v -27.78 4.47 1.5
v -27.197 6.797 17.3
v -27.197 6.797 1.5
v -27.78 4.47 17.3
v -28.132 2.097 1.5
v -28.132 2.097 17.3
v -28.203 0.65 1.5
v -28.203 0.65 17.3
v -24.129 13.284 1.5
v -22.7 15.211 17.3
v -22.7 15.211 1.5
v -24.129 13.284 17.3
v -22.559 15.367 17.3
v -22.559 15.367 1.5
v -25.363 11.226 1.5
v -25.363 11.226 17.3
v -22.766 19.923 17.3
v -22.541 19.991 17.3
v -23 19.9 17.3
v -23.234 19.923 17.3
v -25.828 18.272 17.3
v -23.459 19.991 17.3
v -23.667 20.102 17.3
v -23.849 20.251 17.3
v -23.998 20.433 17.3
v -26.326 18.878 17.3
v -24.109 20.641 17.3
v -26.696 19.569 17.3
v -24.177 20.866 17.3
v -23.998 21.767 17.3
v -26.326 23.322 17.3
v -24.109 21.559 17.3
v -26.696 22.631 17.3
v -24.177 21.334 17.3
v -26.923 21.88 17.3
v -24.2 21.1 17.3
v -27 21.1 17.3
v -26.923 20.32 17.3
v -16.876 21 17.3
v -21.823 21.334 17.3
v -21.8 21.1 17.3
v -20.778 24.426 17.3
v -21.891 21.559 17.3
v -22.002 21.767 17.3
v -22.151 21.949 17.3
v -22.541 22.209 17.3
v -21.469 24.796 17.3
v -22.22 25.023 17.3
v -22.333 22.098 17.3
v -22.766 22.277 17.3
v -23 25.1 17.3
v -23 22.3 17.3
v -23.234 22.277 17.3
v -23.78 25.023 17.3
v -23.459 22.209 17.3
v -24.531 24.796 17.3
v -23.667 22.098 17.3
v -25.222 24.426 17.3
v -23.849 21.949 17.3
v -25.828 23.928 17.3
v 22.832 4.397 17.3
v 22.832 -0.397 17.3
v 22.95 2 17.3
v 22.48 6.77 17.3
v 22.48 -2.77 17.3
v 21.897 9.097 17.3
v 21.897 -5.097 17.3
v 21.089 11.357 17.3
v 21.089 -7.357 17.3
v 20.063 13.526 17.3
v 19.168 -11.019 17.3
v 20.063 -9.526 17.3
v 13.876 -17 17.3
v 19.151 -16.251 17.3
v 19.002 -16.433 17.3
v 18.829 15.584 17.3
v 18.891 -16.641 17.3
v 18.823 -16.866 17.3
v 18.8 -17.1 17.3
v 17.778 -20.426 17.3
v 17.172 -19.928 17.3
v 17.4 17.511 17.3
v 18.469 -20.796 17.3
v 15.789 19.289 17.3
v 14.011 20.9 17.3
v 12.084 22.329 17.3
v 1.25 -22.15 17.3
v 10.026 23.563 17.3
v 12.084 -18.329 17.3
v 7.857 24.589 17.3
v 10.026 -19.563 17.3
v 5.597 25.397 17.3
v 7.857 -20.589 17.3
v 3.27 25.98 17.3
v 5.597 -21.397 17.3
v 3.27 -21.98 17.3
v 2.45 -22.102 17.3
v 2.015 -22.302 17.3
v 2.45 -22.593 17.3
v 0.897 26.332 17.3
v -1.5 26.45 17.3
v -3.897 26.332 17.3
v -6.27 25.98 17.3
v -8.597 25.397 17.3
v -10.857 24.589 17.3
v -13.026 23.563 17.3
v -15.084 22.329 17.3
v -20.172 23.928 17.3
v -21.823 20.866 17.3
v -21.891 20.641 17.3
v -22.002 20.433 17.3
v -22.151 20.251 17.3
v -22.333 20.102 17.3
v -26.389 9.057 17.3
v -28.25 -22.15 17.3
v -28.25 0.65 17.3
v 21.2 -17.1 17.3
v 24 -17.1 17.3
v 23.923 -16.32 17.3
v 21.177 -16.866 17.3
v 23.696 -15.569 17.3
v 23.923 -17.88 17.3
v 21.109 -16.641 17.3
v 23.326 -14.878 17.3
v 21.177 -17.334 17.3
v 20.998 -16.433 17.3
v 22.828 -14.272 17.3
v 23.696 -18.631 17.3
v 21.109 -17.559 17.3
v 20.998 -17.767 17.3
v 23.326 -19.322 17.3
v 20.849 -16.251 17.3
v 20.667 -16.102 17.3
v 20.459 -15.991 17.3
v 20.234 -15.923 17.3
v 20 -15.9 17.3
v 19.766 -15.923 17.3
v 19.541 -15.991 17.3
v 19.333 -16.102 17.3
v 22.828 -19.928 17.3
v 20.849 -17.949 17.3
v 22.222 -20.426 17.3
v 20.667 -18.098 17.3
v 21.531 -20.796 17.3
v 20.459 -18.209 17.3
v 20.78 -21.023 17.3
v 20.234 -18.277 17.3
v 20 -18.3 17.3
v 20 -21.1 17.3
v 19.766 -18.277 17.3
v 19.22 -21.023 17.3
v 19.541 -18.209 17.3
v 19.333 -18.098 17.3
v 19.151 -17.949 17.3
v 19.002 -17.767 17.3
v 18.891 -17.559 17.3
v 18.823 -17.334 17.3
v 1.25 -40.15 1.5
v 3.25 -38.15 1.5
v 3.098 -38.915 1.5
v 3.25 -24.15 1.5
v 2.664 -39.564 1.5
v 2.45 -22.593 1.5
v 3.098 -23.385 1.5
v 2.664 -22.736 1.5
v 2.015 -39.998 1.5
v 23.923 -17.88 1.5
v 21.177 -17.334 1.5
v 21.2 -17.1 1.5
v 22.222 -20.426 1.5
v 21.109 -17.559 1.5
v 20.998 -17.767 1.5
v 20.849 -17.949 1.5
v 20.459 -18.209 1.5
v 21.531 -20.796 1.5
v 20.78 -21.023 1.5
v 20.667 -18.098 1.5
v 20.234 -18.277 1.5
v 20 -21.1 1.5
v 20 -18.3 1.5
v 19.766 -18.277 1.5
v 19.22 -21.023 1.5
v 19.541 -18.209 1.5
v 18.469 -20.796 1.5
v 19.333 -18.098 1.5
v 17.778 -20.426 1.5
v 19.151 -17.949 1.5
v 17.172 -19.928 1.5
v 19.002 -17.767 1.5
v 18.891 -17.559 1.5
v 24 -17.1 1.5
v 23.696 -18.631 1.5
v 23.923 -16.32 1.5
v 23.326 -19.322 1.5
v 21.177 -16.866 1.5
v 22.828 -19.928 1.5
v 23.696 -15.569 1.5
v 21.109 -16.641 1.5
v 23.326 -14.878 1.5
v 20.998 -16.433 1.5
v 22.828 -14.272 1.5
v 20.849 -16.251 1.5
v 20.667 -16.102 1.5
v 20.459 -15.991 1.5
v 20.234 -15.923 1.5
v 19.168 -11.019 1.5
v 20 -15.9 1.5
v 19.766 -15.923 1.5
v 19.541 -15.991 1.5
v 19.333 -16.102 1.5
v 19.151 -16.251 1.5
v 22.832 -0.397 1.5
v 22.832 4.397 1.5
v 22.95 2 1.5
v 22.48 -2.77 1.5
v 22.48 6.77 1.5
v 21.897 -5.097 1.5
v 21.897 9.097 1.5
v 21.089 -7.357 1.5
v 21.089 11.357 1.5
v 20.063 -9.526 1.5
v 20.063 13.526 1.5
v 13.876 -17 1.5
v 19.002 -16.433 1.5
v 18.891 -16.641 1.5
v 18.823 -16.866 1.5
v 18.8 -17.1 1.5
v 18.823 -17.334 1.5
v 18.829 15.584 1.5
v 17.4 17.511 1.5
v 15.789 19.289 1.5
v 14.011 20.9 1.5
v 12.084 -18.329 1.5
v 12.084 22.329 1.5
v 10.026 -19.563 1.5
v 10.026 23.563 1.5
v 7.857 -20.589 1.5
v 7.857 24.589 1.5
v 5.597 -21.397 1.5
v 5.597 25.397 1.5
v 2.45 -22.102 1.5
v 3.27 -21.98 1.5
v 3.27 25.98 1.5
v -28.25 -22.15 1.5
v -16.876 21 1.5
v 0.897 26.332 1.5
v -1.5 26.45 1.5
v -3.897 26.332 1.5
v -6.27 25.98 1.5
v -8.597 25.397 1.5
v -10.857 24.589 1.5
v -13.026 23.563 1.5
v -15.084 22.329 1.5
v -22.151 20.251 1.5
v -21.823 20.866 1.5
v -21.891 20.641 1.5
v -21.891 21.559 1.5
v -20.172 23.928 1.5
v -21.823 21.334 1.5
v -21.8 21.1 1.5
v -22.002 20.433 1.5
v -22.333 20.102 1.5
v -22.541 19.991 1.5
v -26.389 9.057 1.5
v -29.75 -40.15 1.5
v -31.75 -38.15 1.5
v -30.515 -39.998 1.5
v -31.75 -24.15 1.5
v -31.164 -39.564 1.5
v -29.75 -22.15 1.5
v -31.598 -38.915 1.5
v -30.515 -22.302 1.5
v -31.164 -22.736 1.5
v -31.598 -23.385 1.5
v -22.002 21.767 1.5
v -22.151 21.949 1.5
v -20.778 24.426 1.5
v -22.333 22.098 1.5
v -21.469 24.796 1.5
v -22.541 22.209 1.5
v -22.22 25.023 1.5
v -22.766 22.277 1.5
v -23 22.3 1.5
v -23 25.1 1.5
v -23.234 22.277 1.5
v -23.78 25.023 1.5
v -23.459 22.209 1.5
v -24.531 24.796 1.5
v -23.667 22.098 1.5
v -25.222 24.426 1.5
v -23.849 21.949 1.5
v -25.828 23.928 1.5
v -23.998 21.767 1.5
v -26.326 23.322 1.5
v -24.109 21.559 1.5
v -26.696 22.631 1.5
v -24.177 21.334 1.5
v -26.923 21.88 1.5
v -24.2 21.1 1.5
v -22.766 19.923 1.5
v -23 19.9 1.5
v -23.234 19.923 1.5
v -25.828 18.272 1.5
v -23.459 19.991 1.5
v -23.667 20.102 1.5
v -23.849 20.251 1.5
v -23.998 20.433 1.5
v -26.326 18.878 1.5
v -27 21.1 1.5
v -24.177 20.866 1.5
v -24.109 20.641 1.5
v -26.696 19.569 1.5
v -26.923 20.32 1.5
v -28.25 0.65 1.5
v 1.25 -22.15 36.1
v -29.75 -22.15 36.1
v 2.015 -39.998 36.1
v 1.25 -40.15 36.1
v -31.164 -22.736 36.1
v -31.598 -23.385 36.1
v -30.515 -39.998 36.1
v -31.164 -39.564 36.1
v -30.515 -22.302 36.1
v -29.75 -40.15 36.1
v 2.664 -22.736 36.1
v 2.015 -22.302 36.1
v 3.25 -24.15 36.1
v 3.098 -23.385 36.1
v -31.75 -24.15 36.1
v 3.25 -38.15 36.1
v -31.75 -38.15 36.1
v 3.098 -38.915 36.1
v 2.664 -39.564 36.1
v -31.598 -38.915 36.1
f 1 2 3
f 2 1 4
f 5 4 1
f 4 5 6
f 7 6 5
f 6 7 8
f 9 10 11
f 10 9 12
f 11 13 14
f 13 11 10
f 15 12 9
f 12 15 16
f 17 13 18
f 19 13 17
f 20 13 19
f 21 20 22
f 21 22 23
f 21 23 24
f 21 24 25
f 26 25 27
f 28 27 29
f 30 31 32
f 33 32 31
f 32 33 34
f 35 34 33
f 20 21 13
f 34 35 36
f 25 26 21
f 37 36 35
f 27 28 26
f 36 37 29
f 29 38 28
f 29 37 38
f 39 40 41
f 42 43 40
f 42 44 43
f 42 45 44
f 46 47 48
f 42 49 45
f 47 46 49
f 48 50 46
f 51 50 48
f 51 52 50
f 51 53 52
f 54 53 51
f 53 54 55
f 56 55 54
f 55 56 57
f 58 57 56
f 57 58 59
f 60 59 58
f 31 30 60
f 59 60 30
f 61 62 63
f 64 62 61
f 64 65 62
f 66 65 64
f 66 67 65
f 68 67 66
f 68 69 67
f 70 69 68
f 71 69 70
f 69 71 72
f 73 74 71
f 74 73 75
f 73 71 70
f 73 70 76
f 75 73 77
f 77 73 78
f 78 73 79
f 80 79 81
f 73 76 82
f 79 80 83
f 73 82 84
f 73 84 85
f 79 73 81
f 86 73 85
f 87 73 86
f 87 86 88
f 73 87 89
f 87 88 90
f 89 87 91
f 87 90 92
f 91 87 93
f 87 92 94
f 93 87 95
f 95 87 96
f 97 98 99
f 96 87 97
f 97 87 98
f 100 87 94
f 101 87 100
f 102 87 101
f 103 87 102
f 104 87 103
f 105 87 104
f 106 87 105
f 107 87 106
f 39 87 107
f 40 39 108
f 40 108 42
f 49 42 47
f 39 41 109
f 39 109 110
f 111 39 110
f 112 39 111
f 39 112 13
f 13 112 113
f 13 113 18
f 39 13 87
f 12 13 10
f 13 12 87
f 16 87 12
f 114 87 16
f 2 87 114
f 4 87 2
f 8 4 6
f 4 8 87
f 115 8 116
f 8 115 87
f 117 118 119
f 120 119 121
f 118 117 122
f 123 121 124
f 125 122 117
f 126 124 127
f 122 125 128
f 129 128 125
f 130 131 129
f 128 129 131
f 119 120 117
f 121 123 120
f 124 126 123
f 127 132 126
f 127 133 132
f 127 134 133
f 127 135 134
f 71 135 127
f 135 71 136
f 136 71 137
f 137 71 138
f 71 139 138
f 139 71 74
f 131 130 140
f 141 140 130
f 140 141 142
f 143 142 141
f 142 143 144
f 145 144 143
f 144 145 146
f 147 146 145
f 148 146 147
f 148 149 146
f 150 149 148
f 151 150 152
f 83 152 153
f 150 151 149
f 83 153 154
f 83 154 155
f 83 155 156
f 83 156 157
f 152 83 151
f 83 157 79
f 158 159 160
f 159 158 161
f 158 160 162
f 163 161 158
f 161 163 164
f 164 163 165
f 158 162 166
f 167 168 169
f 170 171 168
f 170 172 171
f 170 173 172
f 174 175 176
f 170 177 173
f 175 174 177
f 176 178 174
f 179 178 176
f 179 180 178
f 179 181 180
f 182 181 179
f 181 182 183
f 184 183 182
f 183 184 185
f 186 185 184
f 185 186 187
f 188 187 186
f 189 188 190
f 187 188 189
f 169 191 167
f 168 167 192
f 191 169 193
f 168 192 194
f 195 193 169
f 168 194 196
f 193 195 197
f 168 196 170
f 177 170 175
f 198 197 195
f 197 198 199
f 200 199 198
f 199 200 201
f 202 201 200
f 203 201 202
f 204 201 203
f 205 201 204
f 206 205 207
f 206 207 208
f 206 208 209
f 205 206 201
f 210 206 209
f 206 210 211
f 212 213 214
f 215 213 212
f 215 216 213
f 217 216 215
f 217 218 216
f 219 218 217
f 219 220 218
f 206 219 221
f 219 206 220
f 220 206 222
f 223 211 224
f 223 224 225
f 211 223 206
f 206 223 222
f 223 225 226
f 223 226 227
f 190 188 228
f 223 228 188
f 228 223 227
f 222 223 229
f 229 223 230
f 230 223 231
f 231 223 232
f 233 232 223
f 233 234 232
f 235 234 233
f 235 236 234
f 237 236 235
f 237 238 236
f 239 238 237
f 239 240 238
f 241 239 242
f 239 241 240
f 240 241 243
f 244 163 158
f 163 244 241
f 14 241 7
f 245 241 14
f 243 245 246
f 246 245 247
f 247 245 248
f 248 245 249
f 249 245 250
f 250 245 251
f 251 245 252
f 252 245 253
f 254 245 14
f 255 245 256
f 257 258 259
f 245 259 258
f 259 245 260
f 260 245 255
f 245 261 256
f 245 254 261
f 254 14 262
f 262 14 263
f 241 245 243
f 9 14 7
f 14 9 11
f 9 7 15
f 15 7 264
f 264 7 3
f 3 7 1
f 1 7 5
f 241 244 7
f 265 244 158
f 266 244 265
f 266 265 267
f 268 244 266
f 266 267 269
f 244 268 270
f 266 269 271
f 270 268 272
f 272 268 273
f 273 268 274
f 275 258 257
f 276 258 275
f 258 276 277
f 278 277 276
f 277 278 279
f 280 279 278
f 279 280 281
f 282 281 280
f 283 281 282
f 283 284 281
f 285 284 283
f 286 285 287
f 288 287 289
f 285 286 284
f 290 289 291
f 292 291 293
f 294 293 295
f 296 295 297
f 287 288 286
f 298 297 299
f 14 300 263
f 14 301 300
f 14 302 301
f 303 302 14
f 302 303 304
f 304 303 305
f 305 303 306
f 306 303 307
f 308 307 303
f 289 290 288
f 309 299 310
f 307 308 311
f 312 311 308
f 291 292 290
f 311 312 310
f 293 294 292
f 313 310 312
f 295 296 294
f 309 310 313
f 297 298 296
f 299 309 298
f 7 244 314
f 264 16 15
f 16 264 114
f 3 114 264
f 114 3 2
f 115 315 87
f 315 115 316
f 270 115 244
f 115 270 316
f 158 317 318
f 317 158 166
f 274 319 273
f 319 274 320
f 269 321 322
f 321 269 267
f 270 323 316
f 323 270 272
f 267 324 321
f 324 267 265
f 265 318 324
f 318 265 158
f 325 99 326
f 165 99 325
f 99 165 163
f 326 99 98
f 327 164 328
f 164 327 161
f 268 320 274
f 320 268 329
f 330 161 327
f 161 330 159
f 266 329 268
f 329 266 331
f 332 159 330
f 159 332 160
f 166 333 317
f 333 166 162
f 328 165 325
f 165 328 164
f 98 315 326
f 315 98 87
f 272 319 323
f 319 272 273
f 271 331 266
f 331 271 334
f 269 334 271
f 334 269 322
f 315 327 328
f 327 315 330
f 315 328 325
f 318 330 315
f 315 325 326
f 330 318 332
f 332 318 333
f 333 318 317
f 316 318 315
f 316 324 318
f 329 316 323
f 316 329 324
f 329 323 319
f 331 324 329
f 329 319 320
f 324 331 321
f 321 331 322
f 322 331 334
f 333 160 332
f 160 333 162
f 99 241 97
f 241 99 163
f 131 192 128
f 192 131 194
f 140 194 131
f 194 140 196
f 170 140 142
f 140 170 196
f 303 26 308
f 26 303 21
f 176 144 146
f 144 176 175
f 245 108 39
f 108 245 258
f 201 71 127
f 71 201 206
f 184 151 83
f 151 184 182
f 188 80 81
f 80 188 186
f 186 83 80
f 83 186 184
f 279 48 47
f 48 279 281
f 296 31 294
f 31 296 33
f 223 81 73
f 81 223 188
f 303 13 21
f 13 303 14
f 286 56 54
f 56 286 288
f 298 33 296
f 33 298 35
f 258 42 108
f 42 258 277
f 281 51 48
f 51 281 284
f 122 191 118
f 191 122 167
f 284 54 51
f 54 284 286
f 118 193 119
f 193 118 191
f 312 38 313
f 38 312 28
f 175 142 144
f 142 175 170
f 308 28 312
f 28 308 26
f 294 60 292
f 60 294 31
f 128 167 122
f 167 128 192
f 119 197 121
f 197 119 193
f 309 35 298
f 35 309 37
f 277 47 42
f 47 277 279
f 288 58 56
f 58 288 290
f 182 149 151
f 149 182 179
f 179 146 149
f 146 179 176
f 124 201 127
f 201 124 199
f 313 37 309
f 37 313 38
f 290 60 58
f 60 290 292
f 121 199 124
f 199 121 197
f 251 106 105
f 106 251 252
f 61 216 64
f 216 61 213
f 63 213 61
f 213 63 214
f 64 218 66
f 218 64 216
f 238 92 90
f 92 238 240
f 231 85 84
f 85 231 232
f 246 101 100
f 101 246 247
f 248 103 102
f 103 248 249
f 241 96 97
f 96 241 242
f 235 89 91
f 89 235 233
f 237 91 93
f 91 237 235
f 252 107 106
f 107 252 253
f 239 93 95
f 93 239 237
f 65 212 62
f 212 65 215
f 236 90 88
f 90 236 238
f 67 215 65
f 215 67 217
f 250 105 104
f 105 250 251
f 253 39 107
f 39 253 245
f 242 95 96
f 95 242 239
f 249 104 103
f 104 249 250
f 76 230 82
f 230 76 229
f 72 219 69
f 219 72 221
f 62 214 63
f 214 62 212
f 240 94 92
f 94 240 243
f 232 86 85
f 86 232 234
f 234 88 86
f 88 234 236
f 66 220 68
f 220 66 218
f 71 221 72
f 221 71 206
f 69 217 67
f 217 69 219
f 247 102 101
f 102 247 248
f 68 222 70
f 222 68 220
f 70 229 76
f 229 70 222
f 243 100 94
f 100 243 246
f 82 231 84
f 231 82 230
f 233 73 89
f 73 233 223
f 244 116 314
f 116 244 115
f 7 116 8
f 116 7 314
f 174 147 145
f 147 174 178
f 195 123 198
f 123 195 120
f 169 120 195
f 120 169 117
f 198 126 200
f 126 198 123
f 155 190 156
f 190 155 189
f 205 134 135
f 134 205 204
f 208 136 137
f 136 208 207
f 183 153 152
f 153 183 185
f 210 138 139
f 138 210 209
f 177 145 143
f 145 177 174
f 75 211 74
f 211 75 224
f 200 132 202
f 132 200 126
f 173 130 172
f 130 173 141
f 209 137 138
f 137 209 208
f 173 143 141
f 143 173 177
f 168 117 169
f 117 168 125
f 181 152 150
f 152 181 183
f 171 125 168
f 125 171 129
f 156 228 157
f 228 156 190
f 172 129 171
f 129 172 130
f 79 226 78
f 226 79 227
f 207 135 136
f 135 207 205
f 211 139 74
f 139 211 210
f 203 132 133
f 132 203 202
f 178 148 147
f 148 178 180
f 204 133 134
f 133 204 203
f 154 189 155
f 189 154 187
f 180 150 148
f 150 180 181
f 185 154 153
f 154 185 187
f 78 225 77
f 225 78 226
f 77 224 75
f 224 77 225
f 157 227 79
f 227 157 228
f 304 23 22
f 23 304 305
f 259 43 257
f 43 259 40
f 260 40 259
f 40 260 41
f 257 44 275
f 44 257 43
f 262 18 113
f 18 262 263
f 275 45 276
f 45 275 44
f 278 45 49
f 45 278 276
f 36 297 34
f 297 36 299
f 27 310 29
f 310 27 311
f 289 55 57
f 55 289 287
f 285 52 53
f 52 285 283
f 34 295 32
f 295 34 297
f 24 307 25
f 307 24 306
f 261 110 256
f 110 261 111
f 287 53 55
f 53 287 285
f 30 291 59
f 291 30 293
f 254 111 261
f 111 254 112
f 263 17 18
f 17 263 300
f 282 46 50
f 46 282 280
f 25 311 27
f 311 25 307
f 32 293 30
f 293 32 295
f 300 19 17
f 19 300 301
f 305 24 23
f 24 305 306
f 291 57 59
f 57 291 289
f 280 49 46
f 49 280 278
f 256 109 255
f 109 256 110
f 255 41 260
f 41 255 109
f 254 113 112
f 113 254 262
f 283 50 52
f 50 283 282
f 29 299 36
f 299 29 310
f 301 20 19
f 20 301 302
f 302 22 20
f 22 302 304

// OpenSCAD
// file: ../../configuration.scad
/*
	Konfiguracni soubor 3D tiskarny RebeliX BoX
	
	Sledujte nas na:		  
			www.RebeliX.cz
			www.facebook.com/RebeliX.cz
			https://twitter.com/reprap4u
			https://plus.google.com/+Reprap4uCz-3Dtiskarna-RebeliX
			
	License: GNU GPL v3
*/


/* ========================== Z probe ======================= */

// Prumer Z probe
Z_probe_D = 12.2;
// Delka Z probe
Z_probe_H = 62;
// Delka zavitu
Z_probe_screw_H = 42;
// Prumer matky k sonde
Z_probe_nut_D = 19;
// Vyska matky
Z_probe_nut_H = 3.8;
// Prumer podlozky k sonde
Z_probe_washer_D = 22;


/* ================ Parametry energo retezu ================= */

// Sirka zarazek retezu
mantinel_W = 1.4; 

// Sirka prichytu retezu (v miste, kde jsou otvory na pridelani)
chain_mount_W = 18;

// Vyska retezu 
chain_H = 15.4;
//chain_H = 14.8;

// Sirka retezu
chain_W = chain_mount_W + 0.9;

//Vzdalenost od profilu
chain_x_offset = 1.5;


/* =================== Nastaveni pro osu Z ================== */

// Prumer hlazene tyce
//rod_D = 8.1; // 8 mm
rod_D = 10.1; // 10 mm
//rod_D = 12.2; // 12 mm

// Vzdalenost stredu hlazene tyce od hrany profilu
rod_offset = 20;

// Prostor kolem maticky pro pridelani heatbed
mount_dia = 20;


/* ============== Parametry kolejnice a voziku ============== */

// Sirka kolejnice
rail_W = 12;

// Tloustka kolejnice
rail_H = 8;

// Jak daleko od rezu je prvni otvor v kolejnici
rail_first_hole = 11;

// Vzdalenost otvoru v kolejnici
rail_hole_distance = 25;

// Otvory pro pridelani na voziku MGN12
MGN12_holes = [
  [10, 10, 0],
  [10, -10, 0],
  [-10, -10, 0],
  [-10, 10, 0]
];

// Vyska pojezdu MGN12_H i s kolejnici
MGN12_H = 13;

// Sirka voziku MGN12
MGN12_W = 27;


/* ======================= Obecne =========================== */

// Sirka hlinikoveho profilu
profile_width = 30;

// Radius zakulacenych rohu
corner_rad = 6; 


/* ================== Spojovaci material ==================== */

// --------------- M3 ----------------
// Prumer hlavy M3 sroubu
M3_head_D = 6.5;

// Prumer M3 sroubu
M3_screw_D = 3.3;

// Vyska hlavy M3 sroubu
M3_head_H = 2;

// Prumer M3 podlozek
M3_washer_D = 6.8;

// Tloustka M3 podlozky
M3_washer_H = 0.5;

// Prumer M3 matky
M3_nut_D=6.6;

// Vyska M3 matky
M3_nut_H = 3;

M3x10_offset = 6; // Sroub M3x10;

// --------------- M4 ----------------

// Prumer hlavy M4 sroubu
M4_head_D = 7.6;

// Prumer M4 sroubu
M4_screw_D = 4.3;

// Vyska hlavy M4 sroubu
M4_head_H = 4;

// Tloustka M4 podlozky
M4_washer_H = 0.8;

// Prumer M4 matky
M4_nut_D=8.4;

// Vyska M4 matky
M4_nut_H=3.5;

// --------------- M6 ----------------

// Prumer hlavy M6 sroubu
M6_head_D = 11.6;

// Prumer M6 sroubu
M6_screw_D = 6.3;

// Vyska hlavy M6 sroubu
M6_head_H = 3.6;
//M6_head_H = 4.5;

// Prumer M6 podlozek
M6_washer_D = 18;

// Tloustka M6 podlozky
M6_washer_H = 2;

M6x14_offset = 7; // Sroub M6x14;

// Sirka matky do profilu (pokud neni pouzita, tak 0)
//profile_nut_W = 12.1;
profile_nut_W = 9.5;
//profile_nut_W = 0;

/* ======================== Remenice ======================== */

// ------------- GT2/20 --------------

// Vyska ozubeneho kolecka
GT2_pulley_H = 16;
// Prumer v miste zubu na ozubenem kolecku
GT2_pulley_gear_D = 12.2;
// Vydalenost zubu na ozubenem kole od hrany s cervikem
GT2_pulley_teeth_offset = 7;

// Vyska ozubeneho kolecka 
pulley_H = GT2_pulley_H;
// Prumer v miste zubu na ozubenem kolecku
pulley_gear_D = GT2_pulley_gear_D;
// Vydalenost zubu na ozubenem kole od hrany s cervikem
pulley_teeth_offset = GT2_pulley_teeth_offset;


/* ========================== Remen ========================= */

// -------------- GT2 ----------------
 
belt_tooth_distance = 2;
belt_tooth_ratio = 0.5;

// Tloustka remenu
//belt_thick = 2.5;
belt_thick = 1.6; //1.4

// Sirka remenu
belt_width = 6;

// Tloustka dvou remenu "zakousnutych" do sebe
belt_lock_thickness = 2*belt_thick;

belt_core_thickness = 0.75;
belt_tooth_height = 1.7;

// Vyska zubu na remenu
//belt_tooth_height = 0.8;

//belt_core_thickness = 0.75;
//belt_tooth_height = 1.7;

// -------------- T2.5 ----------------

//belt_tooth_distance = 2.5;
//belt_tooth_ratio = 0.68;


/* ======================= Loziska ========================== */

// ----------- Lozisko 608 ----------- 

// Vnejsi prumer loziska
bearing_608_OUT_D = 22.1;
// Vnitrni prumer loziska
bearing_608_IN_D = 8;
// Vnejsi prumer otocneho stredu loziska
bearing_608_CENTER_D = 13;
// Vyska loziska
bearing_608_H = 7;

// ----------- Lozisko F624 ----------

// Vnejsi prumer loziska
bearing_F624_OUT_D1 = 16;
// Vnejsi prumer zuzene casti loziska
bearing_F624_OUT_D2 = 13;
// Vnitrni prumer loziska
bearing_F624_IN_D = 4;
// Vnejsi prumer otocneho stredu loziska
bearing_F624_CENTER_D = 0;
// Vyska loziska
bearing_F624_H = 5;
// Vyska okraje na lozisku
bearing_F624_Flange_H = 1;

// ----------- Lozisko F623 ----------

// Vnejsi prumer loziska
bearing_F623_OUT_D = 10;
// Vnitrni prumer loziska
bearing_F623_IN_D = 3;
// Vyska loziska
bearing_F623_H = 4;

// --------- Axialni lozisko ---------

// Prumer loziska
axial_bearing_D = 16 + 0.8;
// Vyska spodni casti
axial_bearing_H1 = 1;
// Vyska casti s kulickami
axial_bearing_H2 = 4;


/* ==================== Idler X,Y,Z ========================= */

// ---------- Idler 2x F624 ----------
///*
idler_OUT_D1 = bearing_F624_OUT_D1;
idler_OUT_D2 = bearing_F624_OUT_D2;
idler_IN_D = bearing_F624_IN_D;
idler_CENTER_D = bearing_F624_CENTER_D;
idler_H = 2*bearing_F624_H;
idler_Flange_H = bearing_F624_Flange_H;
idler_Flange_Deep = 0; 

// -------- Idler M4 - sroub ---------
// Prumer sroubu
idler_screw_D = M4_screw_D;
// Prumer hlavy sroubu
idler_screw_head_D = M4_head_D;
// Vyska hlavy sroubu
idler_screw_head_H = M4_head_H;
// Prumer matky
idler_nut_D = M4_nut_D;
// Vyska matky
idler_nut_H = M4_nut_H;
// Tloustka podlozky
idler_washer_H = M4_washer_H;
//*/


// ---------- Idler pulley (20T W6 Bore 3mm without T) ----------
/*
idler_OUT_D1 = 18;
idler_OUT_D2 = GT2_pulley_gear_D;
idler_IN_D = 3;
idler_CENTER_D = 4;
idler_H = 8.5;
idler_Flange_H = (idler_H - 6.5)/2;
idler_Flange_Deep = 0; 

// ---===== M3 - sroub =====--- 
// Prumer sroubu
idler_screw_D = M3_screw_D;
// Prumer hlavy sroubu
idler_screw_head_D = M3_head_D;
// Vyska hlavy sroubu
idler_screw_head_H = M3_head_H;
// Prumer matky
idler_nut_D = M3_nut_D;
// Vyska matky
idler_nut_H = M3_nut_H;
// Tloustka podlozky
idler_washer_H = M3_washer_H;
*/


/* ===================== Lozisko osa Z ========================= */

big_bearing_OUT_D = bearing_608_OUT_D;
big_bearing_IN_D = bearing_608_IN_D;
big_bearing_CENTER_D = bearing_608_CENTER_D;
big_bearing_H = bearing_608_H;


/* ==================== Idler extruder ========================= */

// ---------- Idler 1x 623 ----------

ext_idler_OUT_D = bearing_F623_OUT_D;
ext_idler_IN_D = bearing_F623_IN_D;
ext_idler_H = bearing_F623_H + 4*M3_washer_H;

ext_idler_screw_D = M3_screw_D;
ext_idler_nut_D = M3_nut_D;
ext_idler_nut_H = M3_nut_H;
ext_idler_washer_H = M3_washer_H;


/* ================ Slic3r nastaveni ======================== */

// Vyska vrstvy pro tisknuti dilu [mm]
layer_height = 0.3;

// Sirka vytlacovaneho materialu [mm]
extrusion_width = 0.66; //Slic3r->Print Settings->Advanced->Default extrusion width


/*=================== Nastaveni dilu =========================*/

// Tloustka rohovych spojek
// 5 mm => sroub M6x14 s podlozkou
// 3 mm => sroub M6x12 s podlozkou
coupler_thickness = 5;


/* ======================= Motory =========================== */

// Montazni otvory motoru
motor_mount_holes = [
  [-31/2,-31/2,0],
  [31/2,-31/2,0],
  [31/2,31/2,0],
  [-31/2,31/2,0]
];

// Sirka motoru NEMA17
motor_width = 42.3;

// Delka motoru
//SX17-1003LQFE
motor_length = 29.5;
//SX17-1003, SX17-0503LQEF
//motor_length = 34;
//SX17-1005
//motor_length = 40;
//SX17-0905
//motor_length = 48;
// main file
/* 
   === RebeliX BoX ===

   Blower base 50 mm SUNON
   GNU GPL v3
   Martin Neruda <neruda@RebeliX.cz>
   http://www.RebeliX.cz
*/

//include <../configuration.scad>
include <functions.scad>

fan_height = 15.8;
base_thick = 3;

x1 = 20;
x2 = -23;
y1 = -17.1;
y2 = 21.1;

pos_x = x2 + (x1 - x2)/2;
pos_y = y1 + (y2 - y1)/2;

d_fan = 48.9;
w_fan = 51.7;
l_fan = 51.6;

// Prodlouzeni vydechu oproti datasheetu
vydech_extra = 4;
// Uhel vydech
vydech_angle = 30 - 10;
// Tloustku mezery vydechu
space_thick = 4;

vydech_nasunuti = 2;

vydech_width = 35;
vydech_offset = 0;
//vydech_height = fan_height + 2*base_thick;
vydech_length = 12 + vydech_extra;

vydech_delka = l_fan/2;

// Jak je stred trysku vzdaleny od stredu vydechu
nozzle_offset = 30 + 1 - 7;

module blower_fan_base(base_height,cut = 0)
{
  vydech_height = fan_height + base_height + 3;
  
  hull()
  {  
    translate([x1,y1,0]) cylinder(d=8,h=base_height,$fn=32,center=true);
    translate([x2,y2,0]) cylinder(d=8,h=base_height,$fn=32,center=true);
  }	
  translate([pos_x, pos_y,0]) cylinder(d=d_fan,h=base_height,$fn=64,center=true);
  
  
  intersection()
  {
    translate([pos_x - 2.8 + 0.5, pos_y-2.8 + 0.5,0]) cylinder(d=d_fan,h=base_height,$fn=64,center=true);
    translate([pos_x + d_fan/2 + 20/2 - w_fan,pos_y + d_fan/2 - l_fan/2,0]) cube([20,l_fan,base_height],center=true);
  }	
  
  // Vydech
  translate([pos_x + d_fan/2 + 20/2 - w_fan + 0.5,pos_y + d_fan/2 + vydech_delka/2 - l_fan,0]) cube([20,vydech_delka,base_height],center=true);    
  
  if(!cut)
  {
    translate([pos_x + d_fan/2 + 20 - w_fan - 5.5,pos_y + d_fan/2 - l_fan - vydech_length/2 + 2,vydech_height/2 - base_height/2]) rounded_box(nozzle_offset + 6 + 5,vydech_length + 2,vydech_height,4,1,1,1,1);
	
	translate([pos_x - 10.5, pos_y - 20,0]) cube([d_fan - 20,d_fan - 20,base_height],center=true);
  }
  
  if(cut)
  {  
	// Prodlouzeni vydechu
	translate([pos_x + d_fan/2 + 10.5 - w_fan,pos_y + d_fan/2 + vydech_delka/2 - l_fan - vydech_extra/2,0]) cube([20,vydech_delka + vydech_extra,base_height],center=true);
	
	translate([pos_x + d_fan/2 - w_fan + 6/2 + nozzle_offset/2 + 0.5/2,pos_y + d_fan/2 + vydech_delka/2 - l_fan - vydech_delka/2 - vydech_extra,layer_height]) rounded_box(nozzle_offset + 6 - 0.5,6,fan_height + 2*layer_height,4,1,0,1,0);

  
	intersection()
	{
	  translate([pos_x + d_fan/2 - w_fan + 6 + nozzle_offset - 20/2,pos_y + d_fan/2 + vydech_delka/2 - l_fan - vydech_delka/2 - vydech_extra -20/2,0]) cube([20,20,fan_height],center=true);
	
	  translate([pos_x + d_fan/2 - w_fan + 6 + nozzle_offset - 20,pos_y + d_fan/2 - l_fan - vydech_extra - 6/2,base_height/2]) rotate([-90 - vydech_angle,0,0])
      {
	    cube([20,40,20],center=false);
      }	
	}
	
	translate([pos_x + d_fan/2 - w_fan + 6 + nozzle_offset - 20,pos_y + d_fan/2 - l_fan - vydech_extra - 6/2,base_height/2]) rotate([-90 - vydech_angle,0,0])
    {
	  cube([20,40,3],center=false);
    }
	
	translate([pos_x + d_fan/2 - w_fan + 6 + nozzle_offset - 100/2,pos_y + d_fan/2 - l_fan - vydech_extra - 6/2,base_height/2]) rotate([-90 - vydech_angle,0,0])
    {
	  translate([0,-10,-3 - 2 - 10]) 
	  cube([100,40,3 + 10],center=false);
    }
	
	// Seriznuti vydechu

	// Vyrez pro zasunuti
	translate([pos_x + d_fan/2 - w_fan,pos_y + d_fan/2 + 15/2 - l_fan,-1]) cube([3.5,15,4],center=true);
	
	translate([pos_x + d_fan/2 - w_fan - 3.5/2,pos_y + d_fan/2 + 15/2 - l_fan - 15/2,-1 - 4/2 + 4]) rotate([0,40,0]) cube([3.5,15,4],center=false);
  
	translate([pos_x, pos_y - d_fan/2,-1]) cube([15,3.5,4],center=true);
	translate([pos_x - 15/2, pos_y - d_fan/2 - 3.5/2,-1 - 4/2 + 4]) rotate([-40,0,0]) cube([15,3.5,4],center=false);

    // Otvory pro srouby
    translate([x1,y1,0]) cylinder(d=2.4,h=fan_height + 20,$fn=32,center=true);
    translate([x2,y2,0]) cylinder(d=2.4,h=fan_height + 20,$fn=32,center=true);  
  } 
}

module blower_fan_holes(base_height)
{ 
  // Otvory pro srouby
  translate([x1,y1,0]) cylinder(d=2.4,h=base_height + 20,$fn=32,center=true);
  translate([x2,y2,0]) cylinder(d=2.4,h=base_height + 20,$fn=32,center=true);	
  
  // Stred
  //cylinder(d=31.7,h=height + 1,$fn=64,center=true);
}

module blower_fan(base_height = 15,cut = 0)
{
  difference()
  {
	blower_fan_base(base_height,cut);
    blower_fan_holes(base_height,cut);
  } 
}

  //blower_fan(base_thick,0);
  translate([0,0,fan_height/2 + base_thick/2]) blower_fan(fan_height,0);
  //blower_fan_base(3,0);
